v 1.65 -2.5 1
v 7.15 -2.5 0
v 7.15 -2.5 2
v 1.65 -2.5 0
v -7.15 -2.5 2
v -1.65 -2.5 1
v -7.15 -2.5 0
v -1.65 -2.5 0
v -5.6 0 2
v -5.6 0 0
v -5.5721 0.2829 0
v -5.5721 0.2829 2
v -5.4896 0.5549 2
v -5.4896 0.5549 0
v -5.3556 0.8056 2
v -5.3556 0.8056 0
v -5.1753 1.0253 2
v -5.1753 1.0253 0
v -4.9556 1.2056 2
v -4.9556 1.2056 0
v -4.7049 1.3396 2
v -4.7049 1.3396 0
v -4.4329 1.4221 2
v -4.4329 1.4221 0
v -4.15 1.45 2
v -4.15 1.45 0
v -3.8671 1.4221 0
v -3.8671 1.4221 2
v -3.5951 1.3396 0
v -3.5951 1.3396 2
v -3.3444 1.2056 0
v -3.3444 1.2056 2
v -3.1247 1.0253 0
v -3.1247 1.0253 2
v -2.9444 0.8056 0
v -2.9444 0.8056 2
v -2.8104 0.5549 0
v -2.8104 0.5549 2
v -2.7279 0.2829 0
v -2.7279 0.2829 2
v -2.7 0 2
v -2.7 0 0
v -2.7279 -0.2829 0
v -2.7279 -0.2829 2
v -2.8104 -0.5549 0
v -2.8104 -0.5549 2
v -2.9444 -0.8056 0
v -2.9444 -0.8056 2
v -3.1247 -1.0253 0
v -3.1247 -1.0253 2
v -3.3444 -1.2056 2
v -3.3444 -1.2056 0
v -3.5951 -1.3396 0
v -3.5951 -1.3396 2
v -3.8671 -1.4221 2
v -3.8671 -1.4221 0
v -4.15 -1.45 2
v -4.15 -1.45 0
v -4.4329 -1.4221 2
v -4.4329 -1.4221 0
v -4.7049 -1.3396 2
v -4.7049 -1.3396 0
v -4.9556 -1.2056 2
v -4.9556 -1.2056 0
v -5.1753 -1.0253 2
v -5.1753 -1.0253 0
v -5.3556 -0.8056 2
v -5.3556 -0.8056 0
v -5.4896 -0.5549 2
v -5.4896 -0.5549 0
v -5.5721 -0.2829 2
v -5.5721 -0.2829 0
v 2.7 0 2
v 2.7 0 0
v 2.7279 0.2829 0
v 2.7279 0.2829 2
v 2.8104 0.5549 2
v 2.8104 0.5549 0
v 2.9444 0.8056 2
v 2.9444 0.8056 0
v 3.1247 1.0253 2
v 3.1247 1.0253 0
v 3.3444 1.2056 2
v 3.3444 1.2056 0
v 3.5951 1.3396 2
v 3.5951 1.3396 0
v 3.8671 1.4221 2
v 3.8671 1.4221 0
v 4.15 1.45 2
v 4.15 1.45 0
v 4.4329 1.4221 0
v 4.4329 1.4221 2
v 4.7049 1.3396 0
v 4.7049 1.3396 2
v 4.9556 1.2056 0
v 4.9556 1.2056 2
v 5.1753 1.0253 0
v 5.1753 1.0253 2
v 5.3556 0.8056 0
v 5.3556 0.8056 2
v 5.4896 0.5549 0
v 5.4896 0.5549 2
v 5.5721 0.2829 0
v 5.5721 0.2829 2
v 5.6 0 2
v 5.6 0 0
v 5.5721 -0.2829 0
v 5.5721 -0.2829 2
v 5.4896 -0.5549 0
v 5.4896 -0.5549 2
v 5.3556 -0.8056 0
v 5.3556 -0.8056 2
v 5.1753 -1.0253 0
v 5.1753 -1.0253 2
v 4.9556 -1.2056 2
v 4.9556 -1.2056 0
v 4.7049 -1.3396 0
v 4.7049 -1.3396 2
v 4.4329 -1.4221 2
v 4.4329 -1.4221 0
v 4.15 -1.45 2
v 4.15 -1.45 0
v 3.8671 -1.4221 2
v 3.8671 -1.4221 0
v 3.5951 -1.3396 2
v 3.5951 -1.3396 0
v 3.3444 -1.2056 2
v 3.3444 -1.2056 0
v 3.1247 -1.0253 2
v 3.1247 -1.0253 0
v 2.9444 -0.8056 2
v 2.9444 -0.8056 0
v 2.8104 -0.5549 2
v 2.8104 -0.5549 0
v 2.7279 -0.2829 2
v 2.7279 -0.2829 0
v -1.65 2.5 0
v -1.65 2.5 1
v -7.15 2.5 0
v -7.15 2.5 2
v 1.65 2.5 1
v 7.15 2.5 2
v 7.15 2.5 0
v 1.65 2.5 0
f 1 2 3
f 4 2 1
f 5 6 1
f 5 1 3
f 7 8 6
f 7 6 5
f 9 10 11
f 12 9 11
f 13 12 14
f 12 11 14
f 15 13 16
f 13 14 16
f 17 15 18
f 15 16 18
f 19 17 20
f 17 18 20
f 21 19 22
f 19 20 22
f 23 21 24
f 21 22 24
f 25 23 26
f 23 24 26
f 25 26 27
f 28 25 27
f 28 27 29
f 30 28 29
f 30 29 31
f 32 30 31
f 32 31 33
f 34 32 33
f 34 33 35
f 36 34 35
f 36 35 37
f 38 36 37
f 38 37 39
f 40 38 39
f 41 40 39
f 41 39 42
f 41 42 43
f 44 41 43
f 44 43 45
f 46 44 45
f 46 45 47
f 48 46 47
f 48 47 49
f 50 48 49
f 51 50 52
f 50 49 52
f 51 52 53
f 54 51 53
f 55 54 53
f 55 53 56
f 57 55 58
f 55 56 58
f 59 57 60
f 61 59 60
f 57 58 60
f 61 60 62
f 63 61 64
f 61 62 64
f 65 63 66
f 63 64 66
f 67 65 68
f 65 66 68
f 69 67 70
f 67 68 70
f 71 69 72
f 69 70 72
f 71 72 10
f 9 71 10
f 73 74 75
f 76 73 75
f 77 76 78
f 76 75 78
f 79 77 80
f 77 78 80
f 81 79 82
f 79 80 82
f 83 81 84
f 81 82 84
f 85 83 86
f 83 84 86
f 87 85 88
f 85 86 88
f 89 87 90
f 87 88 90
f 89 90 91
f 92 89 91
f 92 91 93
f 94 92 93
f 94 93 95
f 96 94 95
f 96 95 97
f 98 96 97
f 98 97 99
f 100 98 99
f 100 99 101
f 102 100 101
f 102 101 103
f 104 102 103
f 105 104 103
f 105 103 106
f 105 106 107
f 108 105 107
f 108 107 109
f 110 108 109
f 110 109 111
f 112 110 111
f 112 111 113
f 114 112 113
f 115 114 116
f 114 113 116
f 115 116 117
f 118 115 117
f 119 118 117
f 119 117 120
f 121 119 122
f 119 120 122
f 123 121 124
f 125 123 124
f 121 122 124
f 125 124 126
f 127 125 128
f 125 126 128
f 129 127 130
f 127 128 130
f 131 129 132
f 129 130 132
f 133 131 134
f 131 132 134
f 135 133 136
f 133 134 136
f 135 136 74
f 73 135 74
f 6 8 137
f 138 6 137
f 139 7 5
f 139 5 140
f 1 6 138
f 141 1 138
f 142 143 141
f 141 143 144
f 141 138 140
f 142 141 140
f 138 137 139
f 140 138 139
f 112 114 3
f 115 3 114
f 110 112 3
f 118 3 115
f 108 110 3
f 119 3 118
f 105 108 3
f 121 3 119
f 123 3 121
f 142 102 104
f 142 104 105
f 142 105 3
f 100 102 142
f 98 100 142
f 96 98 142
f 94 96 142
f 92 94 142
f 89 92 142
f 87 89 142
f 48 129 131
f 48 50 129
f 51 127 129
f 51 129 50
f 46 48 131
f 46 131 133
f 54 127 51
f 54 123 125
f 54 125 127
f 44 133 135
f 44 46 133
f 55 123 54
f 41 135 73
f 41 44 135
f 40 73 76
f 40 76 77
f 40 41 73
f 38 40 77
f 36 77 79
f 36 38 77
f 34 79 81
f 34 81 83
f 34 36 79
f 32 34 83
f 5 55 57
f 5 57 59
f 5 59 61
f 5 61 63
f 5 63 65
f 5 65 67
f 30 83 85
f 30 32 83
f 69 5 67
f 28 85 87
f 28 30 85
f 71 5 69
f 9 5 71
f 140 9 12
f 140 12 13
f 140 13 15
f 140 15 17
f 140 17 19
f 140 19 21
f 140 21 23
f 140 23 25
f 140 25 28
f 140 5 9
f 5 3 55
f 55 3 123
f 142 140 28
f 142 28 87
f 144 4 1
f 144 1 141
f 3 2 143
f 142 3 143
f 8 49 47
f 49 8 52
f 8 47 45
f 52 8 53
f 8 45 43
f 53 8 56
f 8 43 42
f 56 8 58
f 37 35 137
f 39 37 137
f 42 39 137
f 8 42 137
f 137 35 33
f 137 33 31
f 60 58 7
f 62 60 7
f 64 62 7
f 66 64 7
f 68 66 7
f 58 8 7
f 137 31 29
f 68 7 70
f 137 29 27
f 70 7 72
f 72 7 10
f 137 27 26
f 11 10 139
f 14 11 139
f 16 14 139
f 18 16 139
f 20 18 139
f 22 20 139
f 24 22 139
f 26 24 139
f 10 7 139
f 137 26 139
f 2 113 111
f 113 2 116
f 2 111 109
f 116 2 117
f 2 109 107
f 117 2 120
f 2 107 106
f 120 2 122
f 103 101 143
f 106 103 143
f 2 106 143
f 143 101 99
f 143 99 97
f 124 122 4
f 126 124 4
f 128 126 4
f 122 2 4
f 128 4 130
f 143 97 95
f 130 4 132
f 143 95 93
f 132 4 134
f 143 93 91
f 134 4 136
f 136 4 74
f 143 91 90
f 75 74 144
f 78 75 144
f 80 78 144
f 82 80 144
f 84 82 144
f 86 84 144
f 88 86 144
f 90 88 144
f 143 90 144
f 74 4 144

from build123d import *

# Parameters (mm, degrees)
SKETCH2_W              = 5
SKETCH2_H              = 14.3
BOSS_EXTRUDE1_DEPTH    = 2
SKETCH2_4_W            = 5
SKETCH2_4_H            = 3.3
CUT_EXTRUDE1_DEPTH     = 1
M2_5_CLEARANCE_HOLE1_D = 2.9


with BuildPart() as part:
    # Sketch2 → Boss-Extrude1 (new body)
    with BuildSketch(Plane(origin=(0, 0, 0), x_dir=(0, 1, 0), z_dir=(0, 0, 1))):
        Rectangle(SKETCH2_W, SKETCH2_H)
    extrude(amount=BOSS_EXTRUDE1_DEPTH)

    # Sketch2<4> → Cut-Extrude1 (cut)
    with BuildSketch(Plane(origin=(0, 0, 0), x_dir=(0, 1, 0), z_dir=(0, 0, 1))):
        Rectangle(SKETCH2_4_W, SKETCH2_4_H)
    extrude(amount=CUT_EXTRUDE1_DEPTH, mode=Mode.SUBTRACT)

    # M2.5 Clearance Hole1 (through all)
    with Locations(Plane.XY.offset(2)):
        with Locations((-4.15, 0), (4.15, 0)):
            Hole(M2_5_CLEARANCE_HOLE1_D / 2)


solid = part.part
